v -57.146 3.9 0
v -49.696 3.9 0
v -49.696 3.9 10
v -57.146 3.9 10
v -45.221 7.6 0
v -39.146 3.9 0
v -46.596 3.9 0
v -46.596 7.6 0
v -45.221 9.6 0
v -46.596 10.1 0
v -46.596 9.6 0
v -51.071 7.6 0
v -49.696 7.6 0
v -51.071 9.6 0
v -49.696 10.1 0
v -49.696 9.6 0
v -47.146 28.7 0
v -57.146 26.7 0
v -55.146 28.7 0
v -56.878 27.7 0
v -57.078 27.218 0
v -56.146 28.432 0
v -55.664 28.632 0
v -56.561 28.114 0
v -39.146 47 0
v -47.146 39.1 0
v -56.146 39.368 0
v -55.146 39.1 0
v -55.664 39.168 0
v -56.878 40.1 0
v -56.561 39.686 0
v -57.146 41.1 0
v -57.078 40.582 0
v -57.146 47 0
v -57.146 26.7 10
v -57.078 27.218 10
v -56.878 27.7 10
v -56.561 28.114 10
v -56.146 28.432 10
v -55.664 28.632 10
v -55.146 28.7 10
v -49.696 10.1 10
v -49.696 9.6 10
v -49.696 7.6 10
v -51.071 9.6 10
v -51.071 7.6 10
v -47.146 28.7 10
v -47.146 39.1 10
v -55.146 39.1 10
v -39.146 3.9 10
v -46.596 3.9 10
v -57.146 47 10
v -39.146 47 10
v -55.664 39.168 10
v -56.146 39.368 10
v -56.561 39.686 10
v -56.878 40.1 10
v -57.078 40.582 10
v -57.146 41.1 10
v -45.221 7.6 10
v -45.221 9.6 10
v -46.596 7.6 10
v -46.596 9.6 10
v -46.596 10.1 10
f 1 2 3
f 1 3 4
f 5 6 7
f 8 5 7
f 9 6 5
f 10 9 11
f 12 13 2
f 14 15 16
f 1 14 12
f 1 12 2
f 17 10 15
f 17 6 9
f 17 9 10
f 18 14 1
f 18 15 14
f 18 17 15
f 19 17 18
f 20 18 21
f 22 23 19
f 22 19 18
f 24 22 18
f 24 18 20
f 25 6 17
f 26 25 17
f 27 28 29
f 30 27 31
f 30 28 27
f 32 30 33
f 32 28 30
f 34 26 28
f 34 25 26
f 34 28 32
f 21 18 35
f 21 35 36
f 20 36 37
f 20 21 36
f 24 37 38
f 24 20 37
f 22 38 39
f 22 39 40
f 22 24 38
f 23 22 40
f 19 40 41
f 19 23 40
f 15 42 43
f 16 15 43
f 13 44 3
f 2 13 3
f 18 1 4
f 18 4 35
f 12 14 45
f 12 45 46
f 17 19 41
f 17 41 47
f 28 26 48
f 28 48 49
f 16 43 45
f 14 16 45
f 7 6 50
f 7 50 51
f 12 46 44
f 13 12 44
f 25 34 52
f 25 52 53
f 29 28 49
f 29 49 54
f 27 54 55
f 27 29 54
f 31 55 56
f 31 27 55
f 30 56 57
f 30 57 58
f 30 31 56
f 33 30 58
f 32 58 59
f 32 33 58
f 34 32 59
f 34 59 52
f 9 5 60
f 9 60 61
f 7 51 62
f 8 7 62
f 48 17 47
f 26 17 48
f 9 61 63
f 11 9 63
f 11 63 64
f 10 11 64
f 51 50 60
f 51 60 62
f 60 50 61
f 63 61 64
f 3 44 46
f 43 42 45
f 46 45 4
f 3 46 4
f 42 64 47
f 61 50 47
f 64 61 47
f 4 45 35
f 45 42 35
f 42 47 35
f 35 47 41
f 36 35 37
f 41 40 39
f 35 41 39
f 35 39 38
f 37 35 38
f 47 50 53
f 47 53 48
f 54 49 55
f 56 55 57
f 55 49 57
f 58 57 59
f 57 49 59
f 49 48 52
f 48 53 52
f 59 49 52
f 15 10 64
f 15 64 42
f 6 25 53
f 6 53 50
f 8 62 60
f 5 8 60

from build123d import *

# Parameters (mm, degrees)
DODANIE_WYCI_GNI_CIE1_DEPTH = 10
WYTNIJ_WYCI_GNI_CIE1_DEPTH  = 10


with BuildPart() as part:
    # Szkic1 → Dodanie-wyciągnięcie1 (new body)
    with BuildSketch(Plane.XY):
        with BuildLine():
            Line((-39.146316842, 3.9), (-57.146316842, 3.9))
            Line((-57.146316842, 3.9), (-57.146316842, 26.7))
            ThreePointArc((-57.146316842, 26.7), (-56.560530404, 28.114213562), (-55.146316842, 28.7))
            Line((-55.146316842, 28.7), (-47.146316842, 28.7))
            Line((-47.146316842, 28.7), (-47.146316842, 39.1))
            Line((-47.146316842, 39.1), (-55.146316842, 39.1))
            ThreePointArc((-55.146316842, 39.1), (-56.560530404, 39.685786438), (-57.146316842, 41.1))
            Line((-57.146316842, 41.1), (-57.146316842, 47))
            Line((-57.146316842, 47), (-39.146316842, 47))
            Line((-39.146316842, 47), (-39.146316842, 3.9))
        make_face()
    extrude(amount=DODANIE_WYCI_GNI_CIE1_DEPTH)

    # Szkic2 → Wytnij-wyciągnięcie1 (cut)
    with BuildSketch(Plane.XY.offset(10)):
        Polygon((-46.596316842, 3.9), (-46.596316842, 7.6), (-45.221316842, 7.6), (-45.221316842, 9.6), (-46.596316842, 9.6), (-46.596316842, 10.1), (-49.696316842, 10.1), (-49.696316842, 9.6), (-51.071316842, 9.6), (-51.071316842, 7.6), (-49.696316842, 7.6), (-49.696316842, 3.9), align=None)
    extrude(amount=-WYTNIJ_WYCI_GNI_CIE1_DEPTH, mode=Mode.SUBTRACT)


solid = part.part
